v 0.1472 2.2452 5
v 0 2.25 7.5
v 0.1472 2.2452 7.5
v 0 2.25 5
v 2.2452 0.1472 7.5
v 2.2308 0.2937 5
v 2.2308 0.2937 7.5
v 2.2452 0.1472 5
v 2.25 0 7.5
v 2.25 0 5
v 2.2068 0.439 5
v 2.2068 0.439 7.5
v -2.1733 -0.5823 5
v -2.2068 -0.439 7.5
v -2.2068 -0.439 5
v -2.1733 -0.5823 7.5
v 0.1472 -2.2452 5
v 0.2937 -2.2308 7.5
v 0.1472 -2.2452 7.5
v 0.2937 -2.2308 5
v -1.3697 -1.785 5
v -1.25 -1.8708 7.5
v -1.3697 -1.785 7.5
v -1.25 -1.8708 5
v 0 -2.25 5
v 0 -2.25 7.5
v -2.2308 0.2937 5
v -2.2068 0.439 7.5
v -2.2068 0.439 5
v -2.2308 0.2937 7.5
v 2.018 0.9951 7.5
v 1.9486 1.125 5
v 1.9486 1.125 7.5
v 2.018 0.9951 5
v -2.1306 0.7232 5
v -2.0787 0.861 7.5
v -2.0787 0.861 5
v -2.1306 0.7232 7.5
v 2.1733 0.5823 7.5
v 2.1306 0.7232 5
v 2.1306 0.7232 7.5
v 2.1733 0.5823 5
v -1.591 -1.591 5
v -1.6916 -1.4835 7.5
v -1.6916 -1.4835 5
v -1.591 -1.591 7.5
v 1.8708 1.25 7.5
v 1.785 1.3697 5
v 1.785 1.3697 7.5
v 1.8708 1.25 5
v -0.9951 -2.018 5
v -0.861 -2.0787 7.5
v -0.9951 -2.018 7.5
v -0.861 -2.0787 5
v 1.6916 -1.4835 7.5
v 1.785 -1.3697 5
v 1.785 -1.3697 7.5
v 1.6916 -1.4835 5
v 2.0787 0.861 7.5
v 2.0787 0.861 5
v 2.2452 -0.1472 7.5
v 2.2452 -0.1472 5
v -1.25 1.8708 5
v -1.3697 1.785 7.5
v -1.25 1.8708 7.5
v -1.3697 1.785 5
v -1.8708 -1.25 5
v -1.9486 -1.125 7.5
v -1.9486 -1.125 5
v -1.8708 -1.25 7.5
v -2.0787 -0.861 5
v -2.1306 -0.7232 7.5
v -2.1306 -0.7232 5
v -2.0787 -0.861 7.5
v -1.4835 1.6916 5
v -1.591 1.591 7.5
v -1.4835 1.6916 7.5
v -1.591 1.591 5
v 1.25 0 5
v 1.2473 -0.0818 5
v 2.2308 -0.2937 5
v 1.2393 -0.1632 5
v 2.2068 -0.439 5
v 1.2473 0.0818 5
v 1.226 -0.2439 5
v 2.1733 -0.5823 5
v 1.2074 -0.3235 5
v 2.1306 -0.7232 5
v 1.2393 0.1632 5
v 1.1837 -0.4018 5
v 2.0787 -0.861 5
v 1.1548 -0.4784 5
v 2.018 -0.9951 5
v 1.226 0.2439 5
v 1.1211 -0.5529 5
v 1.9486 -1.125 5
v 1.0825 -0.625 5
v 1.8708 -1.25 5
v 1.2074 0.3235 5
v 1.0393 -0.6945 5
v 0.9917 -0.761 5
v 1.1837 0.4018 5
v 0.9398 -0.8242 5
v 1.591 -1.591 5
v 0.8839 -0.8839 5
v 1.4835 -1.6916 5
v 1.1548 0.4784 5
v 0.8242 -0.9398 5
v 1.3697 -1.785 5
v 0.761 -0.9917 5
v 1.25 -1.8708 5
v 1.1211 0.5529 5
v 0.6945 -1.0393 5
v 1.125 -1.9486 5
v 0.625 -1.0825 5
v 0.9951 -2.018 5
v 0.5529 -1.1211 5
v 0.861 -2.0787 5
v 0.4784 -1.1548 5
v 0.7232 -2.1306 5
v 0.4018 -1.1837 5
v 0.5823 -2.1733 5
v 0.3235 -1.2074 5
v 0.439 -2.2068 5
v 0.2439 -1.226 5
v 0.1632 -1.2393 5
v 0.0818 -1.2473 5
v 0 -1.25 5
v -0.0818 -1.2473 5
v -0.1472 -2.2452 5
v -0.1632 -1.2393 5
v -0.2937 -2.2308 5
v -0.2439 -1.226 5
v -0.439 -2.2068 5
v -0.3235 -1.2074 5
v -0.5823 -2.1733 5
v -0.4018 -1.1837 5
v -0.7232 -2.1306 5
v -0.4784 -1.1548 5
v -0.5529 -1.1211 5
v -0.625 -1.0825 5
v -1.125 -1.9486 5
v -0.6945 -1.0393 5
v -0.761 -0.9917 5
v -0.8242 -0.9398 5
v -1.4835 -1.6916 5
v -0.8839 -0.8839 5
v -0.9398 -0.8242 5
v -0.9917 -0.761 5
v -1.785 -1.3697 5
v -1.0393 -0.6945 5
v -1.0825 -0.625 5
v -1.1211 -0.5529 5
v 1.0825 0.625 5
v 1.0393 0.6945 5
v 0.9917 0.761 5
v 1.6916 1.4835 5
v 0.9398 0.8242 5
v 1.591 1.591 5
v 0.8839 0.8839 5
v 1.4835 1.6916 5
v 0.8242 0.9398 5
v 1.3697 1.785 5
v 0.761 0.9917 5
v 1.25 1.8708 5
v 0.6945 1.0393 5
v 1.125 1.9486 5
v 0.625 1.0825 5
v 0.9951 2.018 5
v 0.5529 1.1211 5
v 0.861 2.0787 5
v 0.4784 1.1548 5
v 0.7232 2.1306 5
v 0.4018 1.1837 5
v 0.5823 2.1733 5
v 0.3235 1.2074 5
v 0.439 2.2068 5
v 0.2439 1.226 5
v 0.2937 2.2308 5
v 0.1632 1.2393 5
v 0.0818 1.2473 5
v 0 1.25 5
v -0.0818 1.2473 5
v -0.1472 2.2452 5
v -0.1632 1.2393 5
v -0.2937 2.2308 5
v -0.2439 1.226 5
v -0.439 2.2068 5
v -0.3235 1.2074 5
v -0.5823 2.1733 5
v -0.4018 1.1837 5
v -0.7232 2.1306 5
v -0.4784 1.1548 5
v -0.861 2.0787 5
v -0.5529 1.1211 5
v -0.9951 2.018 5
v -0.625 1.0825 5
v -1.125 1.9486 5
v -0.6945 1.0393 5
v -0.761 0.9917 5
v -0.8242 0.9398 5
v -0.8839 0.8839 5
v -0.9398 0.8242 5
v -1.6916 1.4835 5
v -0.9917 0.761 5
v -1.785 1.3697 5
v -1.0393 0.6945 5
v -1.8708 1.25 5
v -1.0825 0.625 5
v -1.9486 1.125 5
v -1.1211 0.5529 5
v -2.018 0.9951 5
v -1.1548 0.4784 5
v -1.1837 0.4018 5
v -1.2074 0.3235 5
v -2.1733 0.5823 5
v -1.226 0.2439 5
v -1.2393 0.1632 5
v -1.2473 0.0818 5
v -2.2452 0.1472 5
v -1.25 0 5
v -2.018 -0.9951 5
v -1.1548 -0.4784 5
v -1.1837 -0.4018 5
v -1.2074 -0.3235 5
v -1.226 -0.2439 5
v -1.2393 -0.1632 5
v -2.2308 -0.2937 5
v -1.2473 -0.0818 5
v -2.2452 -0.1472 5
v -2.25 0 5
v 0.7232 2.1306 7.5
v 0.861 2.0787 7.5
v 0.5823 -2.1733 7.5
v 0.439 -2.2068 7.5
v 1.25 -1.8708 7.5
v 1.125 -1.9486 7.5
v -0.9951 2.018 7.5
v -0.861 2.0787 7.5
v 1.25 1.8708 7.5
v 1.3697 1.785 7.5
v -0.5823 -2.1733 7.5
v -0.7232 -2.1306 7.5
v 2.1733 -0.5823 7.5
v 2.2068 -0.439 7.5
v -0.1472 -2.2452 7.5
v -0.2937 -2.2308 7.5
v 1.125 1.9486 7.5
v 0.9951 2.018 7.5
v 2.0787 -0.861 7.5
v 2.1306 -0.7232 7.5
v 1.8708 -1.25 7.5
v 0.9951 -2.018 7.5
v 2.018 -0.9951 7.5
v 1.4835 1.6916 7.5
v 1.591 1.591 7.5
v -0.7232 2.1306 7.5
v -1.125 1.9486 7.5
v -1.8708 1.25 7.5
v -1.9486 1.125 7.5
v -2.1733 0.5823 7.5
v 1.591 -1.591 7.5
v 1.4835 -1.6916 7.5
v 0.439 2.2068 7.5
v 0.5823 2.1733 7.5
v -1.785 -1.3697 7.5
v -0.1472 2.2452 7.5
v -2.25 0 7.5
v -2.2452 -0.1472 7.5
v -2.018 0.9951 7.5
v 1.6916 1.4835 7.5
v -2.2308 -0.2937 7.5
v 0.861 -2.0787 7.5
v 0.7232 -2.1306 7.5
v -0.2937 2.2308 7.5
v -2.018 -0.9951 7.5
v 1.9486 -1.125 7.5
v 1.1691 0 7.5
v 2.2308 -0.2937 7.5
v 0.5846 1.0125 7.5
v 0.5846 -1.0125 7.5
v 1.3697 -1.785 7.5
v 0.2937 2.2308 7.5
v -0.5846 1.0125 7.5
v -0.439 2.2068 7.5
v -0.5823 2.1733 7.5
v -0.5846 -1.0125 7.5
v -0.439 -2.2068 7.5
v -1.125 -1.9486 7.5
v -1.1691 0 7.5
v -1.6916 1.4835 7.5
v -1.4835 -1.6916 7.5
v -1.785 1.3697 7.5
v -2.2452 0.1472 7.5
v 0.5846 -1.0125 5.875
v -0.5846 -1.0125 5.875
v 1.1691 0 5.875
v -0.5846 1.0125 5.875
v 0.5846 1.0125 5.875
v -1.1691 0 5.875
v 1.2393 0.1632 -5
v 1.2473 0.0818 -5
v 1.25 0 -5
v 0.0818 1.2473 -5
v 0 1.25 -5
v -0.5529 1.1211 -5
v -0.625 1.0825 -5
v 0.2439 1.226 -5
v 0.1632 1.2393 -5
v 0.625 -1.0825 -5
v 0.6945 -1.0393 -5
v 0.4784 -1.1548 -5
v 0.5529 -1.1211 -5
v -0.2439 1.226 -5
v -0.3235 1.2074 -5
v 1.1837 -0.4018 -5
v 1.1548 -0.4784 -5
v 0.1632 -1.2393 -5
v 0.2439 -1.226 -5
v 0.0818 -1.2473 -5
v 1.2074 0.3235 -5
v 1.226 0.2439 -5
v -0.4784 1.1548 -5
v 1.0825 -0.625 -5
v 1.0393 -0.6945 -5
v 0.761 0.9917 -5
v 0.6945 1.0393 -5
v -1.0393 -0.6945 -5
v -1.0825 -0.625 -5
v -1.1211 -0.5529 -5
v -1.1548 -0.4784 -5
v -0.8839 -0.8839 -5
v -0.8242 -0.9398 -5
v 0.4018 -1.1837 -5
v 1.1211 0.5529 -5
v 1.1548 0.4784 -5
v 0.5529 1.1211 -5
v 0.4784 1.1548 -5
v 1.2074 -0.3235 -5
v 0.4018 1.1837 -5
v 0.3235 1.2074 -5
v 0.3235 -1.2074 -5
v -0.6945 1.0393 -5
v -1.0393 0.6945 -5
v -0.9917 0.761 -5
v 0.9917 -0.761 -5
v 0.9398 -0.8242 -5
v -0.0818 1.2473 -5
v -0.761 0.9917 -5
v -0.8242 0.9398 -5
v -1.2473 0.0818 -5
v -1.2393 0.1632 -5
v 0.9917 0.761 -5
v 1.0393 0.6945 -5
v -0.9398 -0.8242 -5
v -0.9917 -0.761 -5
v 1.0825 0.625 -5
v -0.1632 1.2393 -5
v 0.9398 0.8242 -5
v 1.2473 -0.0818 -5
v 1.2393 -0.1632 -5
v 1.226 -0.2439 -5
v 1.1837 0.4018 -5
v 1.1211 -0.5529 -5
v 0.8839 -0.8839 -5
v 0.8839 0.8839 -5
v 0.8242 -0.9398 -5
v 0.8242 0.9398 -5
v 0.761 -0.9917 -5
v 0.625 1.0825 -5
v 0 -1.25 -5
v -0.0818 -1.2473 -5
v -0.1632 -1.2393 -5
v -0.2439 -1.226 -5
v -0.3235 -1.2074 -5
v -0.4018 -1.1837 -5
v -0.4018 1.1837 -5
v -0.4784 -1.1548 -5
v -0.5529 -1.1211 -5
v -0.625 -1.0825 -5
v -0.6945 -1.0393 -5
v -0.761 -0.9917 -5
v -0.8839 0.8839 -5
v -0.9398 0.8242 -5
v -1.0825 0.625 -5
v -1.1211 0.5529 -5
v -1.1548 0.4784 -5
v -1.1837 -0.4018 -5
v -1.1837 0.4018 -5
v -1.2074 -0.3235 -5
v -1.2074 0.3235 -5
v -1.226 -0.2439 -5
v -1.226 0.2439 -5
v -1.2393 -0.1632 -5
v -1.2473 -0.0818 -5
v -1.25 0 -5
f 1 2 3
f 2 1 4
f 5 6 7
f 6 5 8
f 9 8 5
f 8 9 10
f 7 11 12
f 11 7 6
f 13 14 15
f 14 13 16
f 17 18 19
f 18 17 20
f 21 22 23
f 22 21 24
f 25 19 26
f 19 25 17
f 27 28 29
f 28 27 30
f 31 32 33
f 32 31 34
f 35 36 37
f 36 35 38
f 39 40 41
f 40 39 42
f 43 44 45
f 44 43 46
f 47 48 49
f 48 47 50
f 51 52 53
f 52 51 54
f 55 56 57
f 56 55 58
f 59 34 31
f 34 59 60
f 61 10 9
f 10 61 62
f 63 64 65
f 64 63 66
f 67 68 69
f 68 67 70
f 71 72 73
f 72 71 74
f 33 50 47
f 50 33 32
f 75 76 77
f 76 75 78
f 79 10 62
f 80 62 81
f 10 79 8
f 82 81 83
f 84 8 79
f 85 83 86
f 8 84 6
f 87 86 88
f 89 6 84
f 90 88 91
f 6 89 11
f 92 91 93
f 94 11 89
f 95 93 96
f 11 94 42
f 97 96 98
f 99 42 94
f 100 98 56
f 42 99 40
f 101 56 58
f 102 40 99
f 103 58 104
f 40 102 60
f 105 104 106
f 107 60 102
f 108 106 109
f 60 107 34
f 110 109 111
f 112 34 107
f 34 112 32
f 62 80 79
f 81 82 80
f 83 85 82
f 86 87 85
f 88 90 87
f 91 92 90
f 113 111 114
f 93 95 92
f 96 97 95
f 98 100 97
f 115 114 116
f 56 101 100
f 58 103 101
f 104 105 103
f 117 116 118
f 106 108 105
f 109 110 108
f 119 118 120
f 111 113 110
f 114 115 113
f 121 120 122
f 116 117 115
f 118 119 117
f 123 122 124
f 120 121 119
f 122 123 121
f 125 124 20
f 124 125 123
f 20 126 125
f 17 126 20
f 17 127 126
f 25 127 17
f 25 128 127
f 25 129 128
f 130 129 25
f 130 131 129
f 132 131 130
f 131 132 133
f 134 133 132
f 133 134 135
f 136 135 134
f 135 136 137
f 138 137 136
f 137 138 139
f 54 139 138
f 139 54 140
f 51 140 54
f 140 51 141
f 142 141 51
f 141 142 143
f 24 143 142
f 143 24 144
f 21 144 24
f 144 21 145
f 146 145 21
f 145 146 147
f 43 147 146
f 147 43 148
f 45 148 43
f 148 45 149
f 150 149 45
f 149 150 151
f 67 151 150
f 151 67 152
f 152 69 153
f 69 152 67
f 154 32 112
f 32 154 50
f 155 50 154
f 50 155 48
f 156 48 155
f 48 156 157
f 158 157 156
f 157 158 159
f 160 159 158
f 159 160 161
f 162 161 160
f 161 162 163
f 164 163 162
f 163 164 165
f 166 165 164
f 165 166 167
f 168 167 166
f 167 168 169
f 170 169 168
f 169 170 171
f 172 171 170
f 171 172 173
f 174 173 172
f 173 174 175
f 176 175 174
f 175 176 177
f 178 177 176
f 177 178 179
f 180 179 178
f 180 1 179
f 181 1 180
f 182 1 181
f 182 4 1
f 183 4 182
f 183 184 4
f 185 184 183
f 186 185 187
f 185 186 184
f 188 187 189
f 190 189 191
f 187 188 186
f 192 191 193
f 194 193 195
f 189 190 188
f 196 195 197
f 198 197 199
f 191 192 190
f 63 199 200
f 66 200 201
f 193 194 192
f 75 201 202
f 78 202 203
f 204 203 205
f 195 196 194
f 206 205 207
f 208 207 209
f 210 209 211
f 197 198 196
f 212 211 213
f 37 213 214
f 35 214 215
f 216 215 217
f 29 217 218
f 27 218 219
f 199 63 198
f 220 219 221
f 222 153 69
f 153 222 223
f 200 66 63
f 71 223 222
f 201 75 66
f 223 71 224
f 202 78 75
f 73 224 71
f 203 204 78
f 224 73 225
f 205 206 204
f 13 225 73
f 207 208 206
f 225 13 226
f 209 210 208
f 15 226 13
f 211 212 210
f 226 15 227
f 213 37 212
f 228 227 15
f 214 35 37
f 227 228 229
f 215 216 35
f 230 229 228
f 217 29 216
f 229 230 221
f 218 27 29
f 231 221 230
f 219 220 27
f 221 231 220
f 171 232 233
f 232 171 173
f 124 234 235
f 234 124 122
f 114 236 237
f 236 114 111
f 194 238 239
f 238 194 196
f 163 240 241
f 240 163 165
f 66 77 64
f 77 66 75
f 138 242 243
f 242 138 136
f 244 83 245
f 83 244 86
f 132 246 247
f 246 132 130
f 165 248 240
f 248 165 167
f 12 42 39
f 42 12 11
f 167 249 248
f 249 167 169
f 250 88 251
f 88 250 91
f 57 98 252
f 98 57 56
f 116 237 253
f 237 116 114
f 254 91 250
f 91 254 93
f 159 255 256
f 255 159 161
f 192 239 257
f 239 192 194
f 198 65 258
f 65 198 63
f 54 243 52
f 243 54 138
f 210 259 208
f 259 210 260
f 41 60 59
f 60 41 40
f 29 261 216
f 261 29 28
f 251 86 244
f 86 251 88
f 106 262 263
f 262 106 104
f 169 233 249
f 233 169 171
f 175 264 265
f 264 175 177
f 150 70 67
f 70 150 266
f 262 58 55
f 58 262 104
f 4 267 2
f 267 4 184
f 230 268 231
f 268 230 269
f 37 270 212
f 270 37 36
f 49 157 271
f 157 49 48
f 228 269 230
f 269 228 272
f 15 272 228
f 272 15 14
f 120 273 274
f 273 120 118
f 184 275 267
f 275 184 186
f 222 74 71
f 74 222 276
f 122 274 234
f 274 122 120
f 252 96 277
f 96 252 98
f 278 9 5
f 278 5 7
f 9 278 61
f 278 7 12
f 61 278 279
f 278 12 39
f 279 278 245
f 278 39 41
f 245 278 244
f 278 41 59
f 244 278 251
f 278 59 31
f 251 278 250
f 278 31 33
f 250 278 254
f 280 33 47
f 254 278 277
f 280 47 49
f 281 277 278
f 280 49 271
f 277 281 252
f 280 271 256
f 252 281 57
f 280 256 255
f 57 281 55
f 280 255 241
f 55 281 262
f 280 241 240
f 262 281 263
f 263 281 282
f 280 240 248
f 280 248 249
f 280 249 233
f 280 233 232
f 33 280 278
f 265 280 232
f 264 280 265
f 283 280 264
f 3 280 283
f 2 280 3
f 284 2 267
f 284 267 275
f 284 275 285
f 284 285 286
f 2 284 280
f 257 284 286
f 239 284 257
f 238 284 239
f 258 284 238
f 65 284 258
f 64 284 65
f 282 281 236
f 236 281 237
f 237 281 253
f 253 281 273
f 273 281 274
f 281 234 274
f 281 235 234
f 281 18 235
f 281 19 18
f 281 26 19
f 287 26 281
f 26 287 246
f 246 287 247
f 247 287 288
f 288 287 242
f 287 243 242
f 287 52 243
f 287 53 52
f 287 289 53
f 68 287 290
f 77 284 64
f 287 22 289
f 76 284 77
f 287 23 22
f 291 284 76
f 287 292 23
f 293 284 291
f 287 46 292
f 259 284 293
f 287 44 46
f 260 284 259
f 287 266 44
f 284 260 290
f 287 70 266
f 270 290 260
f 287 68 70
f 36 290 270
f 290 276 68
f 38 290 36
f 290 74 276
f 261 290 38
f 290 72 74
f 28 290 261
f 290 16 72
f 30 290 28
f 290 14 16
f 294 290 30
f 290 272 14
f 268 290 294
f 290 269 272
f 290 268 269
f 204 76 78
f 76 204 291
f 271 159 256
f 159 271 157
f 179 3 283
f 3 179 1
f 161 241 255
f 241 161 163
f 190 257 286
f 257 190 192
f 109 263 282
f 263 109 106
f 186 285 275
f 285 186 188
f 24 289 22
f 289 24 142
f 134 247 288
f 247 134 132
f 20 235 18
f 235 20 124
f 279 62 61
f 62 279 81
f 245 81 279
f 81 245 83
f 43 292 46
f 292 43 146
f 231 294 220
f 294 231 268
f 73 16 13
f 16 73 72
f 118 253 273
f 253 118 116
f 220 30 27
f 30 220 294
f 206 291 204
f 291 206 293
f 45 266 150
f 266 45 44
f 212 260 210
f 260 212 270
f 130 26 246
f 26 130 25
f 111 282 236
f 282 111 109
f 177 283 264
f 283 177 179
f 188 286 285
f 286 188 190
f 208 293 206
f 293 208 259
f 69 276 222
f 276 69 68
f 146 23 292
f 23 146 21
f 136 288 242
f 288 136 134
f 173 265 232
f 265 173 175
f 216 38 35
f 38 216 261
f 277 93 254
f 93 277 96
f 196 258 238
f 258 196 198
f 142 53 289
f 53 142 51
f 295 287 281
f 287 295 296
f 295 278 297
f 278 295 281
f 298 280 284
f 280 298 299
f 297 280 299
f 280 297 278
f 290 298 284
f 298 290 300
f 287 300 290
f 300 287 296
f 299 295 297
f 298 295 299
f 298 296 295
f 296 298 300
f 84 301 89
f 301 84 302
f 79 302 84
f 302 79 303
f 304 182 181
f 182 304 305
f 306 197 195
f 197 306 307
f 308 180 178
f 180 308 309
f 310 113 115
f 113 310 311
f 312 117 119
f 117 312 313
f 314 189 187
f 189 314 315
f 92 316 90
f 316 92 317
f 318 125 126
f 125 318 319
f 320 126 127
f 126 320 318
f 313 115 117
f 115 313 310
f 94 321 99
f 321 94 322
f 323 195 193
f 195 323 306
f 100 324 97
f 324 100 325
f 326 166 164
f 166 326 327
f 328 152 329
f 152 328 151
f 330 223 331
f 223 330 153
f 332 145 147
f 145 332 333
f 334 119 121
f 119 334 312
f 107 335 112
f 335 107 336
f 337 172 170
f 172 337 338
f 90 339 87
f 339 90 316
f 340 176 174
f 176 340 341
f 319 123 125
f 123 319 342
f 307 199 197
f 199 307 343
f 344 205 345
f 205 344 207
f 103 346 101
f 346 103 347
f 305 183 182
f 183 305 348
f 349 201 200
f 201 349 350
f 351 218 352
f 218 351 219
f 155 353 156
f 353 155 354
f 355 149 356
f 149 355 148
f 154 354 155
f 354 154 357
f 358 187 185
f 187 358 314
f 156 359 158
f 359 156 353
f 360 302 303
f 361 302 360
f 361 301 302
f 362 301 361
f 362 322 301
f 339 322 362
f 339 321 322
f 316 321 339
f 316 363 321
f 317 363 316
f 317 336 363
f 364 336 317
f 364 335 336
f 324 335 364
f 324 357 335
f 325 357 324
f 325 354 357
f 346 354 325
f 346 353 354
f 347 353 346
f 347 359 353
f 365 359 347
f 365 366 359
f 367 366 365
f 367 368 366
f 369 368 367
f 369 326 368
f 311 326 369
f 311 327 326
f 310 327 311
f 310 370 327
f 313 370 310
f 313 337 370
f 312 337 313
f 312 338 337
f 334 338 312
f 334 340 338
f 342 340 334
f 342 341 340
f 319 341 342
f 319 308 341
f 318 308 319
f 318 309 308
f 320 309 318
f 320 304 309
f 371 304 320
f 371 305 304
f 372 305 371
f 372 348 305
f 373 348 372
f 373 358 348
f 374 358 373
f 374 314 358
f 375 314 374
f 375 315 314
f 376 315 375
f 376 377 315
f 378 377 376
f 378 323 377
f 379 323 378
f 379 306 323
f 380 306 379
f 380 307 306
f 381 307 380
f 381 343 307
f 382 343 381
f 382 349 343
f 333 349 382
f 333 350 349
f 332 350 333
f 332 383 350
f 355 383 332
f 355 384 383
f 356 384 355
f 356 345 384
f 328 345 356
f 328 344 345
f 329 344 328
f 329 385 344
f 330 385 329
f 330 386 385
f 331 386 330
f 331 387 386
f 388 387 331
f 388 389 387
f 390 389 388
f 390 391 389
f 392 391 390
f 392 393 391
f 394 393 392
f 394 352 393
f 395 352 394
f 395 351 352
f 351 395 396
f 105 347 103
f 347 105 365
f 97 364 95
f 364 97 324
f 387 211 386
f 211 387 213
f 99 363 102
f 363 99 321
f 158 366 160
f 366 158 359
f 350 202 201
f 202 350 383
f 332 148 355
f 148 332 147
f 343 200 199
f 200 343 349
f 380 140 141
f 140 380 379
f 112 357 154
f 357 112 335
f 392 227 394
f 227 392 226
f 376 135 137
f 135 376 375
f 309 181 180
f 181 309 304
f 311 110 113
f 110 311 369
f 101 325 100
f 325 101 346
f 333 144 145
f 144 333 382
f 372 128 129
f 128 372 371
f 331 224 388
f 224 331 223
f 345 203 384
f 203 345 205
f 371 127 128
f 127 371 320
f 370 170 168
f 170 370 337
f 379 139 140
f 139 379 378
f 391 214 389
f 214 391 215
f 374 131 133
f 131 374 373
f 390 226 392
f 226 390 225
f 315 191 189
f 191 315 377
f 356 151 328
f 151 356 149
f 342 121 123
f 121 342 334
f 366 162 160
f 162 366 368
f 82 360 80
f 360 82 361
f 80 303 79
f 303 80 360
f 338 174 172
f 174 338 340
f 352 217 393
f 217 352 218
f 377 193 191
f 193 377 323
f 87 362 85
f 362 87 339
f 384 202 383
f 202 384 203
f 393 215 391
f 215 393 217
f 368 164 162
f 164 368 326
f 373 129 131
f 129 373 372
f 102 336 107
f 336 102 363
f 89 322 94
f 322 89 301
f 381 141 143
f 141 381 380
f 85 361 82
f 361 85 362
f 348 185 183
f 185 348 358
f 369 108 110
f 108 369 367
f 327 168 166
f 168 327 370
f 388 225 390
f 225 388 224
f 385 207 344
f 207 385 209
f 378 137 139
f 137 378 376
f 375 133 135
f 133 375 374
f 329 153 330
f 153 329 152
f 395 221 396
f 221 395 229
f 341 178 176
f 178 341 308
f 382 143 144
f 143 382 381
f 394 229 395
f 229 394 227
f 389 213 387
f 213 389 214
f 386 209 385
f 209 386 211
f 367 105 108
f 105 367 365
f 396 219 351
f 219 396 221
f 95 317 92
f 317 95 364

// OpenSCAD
$fn=96;

module socket_head_cap_screw(d=2.5, L=10, head_d=4.5, head_h=2.5) {
    socket_af = head_d * 0.45;
    socket_depth = head_h * 0.65;
    socket_r = socket_af / sqrt(3);
    union() {
        translate([0,0,-L/2]) cylinder(d=d, h=L, $fn=96);
        translate([0,0,L/2]) difference() {
            cylinder(d=head_d, h=head_h, $fn=96);
            translate([0,0,head_h - socket_depth])
                cylinder(r=socket_r, h=socket_depth + 0.2, $fn=6);
        }
    }
}

socket_head_cap_screw();
